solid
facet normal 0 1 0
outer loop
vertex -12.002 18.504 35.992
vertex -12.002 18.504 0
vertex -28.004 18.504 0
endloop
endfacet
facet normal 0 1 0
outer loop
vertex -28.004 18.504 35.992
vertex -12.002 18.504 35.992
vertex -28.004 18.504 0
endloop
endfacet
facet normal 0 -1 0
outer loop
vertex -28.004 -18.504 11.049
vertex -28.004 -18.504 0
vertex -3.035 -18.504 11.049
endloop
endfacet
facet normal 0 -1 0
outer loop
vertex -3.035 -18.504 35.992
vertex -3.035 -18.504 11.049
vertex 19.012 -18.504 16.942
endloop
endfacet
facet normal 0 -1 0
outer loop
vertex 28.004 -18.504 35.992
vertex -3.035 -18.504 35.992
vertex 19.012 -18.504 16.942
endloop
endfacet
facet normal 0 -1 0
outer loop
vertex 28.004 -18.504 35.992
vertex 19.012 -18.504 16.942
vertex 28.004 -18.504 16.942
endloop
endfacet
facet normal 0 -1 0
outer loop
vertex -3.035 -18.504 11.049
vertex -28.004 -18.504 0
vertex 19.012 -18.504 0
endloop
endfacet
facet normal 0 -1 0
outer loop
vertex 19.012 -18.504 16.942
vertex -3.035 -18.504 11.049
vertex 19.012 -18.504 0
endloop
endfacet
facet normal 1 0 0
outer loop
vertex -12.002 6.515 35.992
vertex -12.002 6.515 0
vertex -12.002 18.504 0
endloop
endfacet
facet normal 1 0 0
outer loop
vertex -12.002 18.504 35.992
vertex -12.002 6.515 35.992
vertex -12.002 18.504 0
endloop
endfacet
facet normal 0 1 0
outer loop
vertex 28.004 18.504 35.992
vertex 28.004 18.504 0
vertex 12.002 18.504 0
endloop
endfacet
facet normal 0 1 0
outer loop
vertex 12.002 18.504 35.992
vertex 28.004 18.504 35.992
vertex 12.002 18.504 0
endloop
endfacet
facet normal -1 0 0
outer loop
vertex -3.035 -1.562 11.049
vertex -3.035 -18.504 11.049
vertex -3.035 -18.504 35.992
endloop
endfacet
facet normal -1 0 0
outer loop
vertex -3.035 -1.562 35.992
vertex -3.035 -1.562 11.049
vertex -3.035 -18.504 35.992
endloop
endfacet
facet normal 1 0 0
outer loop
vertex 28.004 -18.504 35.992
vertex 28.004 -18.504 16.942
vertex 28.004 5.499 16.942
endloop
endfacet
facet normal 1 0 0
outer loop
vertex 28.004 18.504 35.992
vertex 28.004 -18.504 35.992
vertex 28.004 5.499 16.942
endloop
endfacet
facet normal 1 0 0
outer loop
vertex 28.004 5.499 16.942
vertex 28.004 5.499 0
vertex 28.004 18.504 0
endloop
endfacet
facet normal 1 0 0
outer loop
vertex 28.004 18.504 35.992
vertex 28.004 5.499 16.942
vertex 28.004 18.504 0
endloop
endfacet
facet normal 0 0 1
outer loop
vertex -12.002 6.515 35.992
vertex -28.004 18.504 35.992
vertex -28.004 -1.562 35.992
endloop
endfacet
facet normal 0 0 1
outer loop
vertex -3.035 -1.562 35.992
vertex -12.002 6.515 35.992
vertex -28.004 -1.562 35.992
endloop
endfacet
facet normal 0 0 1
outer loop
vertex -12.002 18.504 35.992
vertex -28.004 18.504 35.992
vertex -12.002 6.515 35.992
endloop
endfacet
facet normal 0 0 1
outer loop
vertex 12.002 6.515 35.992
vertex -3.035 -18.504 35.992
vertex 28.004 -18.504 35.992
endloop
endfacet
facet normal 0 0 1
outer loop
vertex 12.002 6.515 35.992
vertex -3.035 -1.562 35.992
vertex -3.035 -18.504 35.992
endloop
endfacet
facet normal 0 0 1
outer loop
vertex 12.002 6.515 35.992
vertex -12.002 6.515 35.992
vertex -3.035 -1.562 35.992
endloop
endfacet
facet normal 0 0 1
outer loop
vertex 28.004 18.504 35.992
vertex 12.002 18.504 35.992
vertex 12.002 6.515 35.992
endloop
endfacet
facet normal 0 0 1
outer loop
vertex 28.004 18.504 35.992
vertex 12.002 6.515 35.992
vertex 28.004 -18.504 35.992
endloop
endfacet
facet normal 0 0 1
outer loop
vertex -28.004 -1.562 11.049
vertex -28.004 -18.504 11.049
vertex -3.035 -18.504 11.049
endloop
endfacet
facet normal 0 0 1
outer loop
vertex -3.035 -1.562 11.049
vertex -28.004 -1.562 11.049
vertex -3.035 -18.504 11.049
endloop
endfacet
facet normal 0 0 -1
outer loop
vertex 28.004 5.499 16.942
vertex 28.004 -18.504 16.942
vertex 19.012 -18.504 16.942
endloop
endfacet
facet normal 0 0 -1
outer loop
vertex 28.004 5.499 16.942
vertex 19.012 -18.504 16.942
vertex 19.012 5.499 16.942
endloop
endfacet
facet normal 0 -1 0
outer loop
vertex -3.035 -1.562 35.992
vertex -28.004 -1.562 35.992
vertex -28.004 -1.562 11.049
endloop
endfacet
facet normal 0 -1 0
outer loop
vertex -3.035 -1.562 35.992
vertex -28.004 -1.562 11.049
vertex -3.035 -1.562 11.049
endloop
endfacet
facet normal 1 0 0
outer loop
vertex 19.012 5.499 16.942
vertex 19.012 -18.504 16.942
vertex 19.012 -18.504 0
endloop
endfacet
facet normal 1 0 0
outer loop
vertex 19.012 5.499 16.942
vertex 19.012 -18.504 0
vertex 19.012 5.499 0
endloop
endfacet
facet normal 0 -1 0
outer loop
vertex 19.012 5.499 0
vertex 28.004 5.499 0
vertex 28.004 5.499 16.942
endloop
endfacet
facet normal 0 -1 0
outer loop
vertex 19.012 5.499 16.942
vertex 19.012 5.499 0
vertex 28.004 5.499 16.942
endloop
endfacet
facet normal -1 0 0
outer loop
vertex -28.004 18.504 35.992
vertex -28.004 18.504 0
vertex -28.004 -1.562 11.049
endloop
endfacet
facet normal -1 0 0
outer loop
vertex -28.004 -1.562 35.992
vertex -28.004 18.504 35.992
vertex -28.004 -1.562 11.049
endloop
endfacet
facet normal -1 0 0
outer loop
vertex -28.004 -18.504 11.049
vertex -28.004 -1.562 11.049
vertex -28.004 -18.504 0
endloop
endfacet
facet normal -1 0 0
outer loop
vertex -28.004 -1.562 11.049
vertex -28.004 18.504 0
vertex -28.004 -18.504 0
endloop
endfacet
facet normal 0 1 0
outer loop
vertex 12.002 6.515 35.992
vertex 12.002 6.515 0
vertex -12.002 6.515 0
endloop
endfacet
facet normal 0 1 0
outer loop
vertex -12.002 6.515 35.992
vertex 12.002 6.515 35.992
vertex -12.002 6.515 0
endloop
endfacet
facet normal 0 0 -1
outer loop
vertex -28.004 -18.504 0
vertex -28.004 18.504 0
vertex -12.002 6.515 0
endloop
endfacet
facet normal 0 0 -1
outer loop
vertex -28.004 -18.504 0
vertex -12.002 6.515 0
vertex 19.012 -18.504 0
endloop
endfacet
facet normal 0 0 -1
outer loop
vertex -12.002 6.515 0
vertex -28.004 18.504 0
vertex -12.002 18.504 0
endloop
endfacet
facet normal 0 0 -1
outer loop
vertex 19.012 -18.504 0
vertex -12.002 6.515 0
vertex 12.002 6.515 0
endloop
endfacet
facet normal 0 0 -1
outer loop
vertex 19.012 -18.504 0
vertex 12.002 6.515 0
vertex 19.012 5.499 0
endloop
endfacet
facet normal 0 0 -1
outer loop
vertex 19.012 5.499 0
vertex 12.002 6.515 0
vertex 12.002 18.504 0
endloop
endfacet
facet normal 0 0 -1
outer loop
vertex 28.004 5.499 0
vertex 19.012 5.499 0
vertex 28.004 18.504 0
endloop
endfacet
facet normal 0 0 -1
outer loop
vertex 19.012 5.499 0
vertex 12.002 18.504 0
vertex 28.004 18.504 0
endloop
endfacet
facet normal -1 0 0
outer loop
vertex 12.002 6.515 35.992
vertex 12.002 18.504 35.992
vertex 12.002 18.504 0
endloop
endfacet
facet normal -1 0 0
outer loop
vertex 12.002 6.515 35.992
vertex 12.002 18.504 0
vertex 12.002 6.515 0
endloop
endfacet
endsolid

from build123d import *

# Parameters (mm, degrees)
F1_DEPTH = 35.9918
F2_W     = 24.003
F2_H     = 16.9418
F3_DEPTH = 8.9916
F4_W     = 24.9682
F4_H     = 24.9428
F5_DEPTH = 16.9418


with BuildPart() as f1:
    # F0 (on Top) → F1 (new body)
    with BuildSketch(Plane.XY):
        Polygon((28.0035, -18.5039), (28.0035, 18.5039), (12.0015, 18.5039), (12.0015, 6.5151), (-12.0015, 6.5151), (-12.0015, 18.5039), (-28.0035, 18.5039), (-28.0035, -18.5039), align=None)
    extrude(amount=F1_DEPTH)

    # F2 (on face) → F3 (cut)
    with BuildSketch(Plane.YZ.offset(28.0035)):
        with Locations((-6.5024, 8.4709)):
            Rectangle(F2_W, F2_H)
    extrude(amount=-F3_DEPTH, mode=Mode.SUBTRACT)

    # F4 (on face) → F5 (cut)
    with BuildSketch(Plane.XZ.offset(18.5039)):
        with Locations((-15.5194, 23.5204)):
            Rectangle(F4_W, F4_H)
    extrude(amount=-F5_DEPTH, mode=Mode.SUBTRACT)


solid = f1.part
